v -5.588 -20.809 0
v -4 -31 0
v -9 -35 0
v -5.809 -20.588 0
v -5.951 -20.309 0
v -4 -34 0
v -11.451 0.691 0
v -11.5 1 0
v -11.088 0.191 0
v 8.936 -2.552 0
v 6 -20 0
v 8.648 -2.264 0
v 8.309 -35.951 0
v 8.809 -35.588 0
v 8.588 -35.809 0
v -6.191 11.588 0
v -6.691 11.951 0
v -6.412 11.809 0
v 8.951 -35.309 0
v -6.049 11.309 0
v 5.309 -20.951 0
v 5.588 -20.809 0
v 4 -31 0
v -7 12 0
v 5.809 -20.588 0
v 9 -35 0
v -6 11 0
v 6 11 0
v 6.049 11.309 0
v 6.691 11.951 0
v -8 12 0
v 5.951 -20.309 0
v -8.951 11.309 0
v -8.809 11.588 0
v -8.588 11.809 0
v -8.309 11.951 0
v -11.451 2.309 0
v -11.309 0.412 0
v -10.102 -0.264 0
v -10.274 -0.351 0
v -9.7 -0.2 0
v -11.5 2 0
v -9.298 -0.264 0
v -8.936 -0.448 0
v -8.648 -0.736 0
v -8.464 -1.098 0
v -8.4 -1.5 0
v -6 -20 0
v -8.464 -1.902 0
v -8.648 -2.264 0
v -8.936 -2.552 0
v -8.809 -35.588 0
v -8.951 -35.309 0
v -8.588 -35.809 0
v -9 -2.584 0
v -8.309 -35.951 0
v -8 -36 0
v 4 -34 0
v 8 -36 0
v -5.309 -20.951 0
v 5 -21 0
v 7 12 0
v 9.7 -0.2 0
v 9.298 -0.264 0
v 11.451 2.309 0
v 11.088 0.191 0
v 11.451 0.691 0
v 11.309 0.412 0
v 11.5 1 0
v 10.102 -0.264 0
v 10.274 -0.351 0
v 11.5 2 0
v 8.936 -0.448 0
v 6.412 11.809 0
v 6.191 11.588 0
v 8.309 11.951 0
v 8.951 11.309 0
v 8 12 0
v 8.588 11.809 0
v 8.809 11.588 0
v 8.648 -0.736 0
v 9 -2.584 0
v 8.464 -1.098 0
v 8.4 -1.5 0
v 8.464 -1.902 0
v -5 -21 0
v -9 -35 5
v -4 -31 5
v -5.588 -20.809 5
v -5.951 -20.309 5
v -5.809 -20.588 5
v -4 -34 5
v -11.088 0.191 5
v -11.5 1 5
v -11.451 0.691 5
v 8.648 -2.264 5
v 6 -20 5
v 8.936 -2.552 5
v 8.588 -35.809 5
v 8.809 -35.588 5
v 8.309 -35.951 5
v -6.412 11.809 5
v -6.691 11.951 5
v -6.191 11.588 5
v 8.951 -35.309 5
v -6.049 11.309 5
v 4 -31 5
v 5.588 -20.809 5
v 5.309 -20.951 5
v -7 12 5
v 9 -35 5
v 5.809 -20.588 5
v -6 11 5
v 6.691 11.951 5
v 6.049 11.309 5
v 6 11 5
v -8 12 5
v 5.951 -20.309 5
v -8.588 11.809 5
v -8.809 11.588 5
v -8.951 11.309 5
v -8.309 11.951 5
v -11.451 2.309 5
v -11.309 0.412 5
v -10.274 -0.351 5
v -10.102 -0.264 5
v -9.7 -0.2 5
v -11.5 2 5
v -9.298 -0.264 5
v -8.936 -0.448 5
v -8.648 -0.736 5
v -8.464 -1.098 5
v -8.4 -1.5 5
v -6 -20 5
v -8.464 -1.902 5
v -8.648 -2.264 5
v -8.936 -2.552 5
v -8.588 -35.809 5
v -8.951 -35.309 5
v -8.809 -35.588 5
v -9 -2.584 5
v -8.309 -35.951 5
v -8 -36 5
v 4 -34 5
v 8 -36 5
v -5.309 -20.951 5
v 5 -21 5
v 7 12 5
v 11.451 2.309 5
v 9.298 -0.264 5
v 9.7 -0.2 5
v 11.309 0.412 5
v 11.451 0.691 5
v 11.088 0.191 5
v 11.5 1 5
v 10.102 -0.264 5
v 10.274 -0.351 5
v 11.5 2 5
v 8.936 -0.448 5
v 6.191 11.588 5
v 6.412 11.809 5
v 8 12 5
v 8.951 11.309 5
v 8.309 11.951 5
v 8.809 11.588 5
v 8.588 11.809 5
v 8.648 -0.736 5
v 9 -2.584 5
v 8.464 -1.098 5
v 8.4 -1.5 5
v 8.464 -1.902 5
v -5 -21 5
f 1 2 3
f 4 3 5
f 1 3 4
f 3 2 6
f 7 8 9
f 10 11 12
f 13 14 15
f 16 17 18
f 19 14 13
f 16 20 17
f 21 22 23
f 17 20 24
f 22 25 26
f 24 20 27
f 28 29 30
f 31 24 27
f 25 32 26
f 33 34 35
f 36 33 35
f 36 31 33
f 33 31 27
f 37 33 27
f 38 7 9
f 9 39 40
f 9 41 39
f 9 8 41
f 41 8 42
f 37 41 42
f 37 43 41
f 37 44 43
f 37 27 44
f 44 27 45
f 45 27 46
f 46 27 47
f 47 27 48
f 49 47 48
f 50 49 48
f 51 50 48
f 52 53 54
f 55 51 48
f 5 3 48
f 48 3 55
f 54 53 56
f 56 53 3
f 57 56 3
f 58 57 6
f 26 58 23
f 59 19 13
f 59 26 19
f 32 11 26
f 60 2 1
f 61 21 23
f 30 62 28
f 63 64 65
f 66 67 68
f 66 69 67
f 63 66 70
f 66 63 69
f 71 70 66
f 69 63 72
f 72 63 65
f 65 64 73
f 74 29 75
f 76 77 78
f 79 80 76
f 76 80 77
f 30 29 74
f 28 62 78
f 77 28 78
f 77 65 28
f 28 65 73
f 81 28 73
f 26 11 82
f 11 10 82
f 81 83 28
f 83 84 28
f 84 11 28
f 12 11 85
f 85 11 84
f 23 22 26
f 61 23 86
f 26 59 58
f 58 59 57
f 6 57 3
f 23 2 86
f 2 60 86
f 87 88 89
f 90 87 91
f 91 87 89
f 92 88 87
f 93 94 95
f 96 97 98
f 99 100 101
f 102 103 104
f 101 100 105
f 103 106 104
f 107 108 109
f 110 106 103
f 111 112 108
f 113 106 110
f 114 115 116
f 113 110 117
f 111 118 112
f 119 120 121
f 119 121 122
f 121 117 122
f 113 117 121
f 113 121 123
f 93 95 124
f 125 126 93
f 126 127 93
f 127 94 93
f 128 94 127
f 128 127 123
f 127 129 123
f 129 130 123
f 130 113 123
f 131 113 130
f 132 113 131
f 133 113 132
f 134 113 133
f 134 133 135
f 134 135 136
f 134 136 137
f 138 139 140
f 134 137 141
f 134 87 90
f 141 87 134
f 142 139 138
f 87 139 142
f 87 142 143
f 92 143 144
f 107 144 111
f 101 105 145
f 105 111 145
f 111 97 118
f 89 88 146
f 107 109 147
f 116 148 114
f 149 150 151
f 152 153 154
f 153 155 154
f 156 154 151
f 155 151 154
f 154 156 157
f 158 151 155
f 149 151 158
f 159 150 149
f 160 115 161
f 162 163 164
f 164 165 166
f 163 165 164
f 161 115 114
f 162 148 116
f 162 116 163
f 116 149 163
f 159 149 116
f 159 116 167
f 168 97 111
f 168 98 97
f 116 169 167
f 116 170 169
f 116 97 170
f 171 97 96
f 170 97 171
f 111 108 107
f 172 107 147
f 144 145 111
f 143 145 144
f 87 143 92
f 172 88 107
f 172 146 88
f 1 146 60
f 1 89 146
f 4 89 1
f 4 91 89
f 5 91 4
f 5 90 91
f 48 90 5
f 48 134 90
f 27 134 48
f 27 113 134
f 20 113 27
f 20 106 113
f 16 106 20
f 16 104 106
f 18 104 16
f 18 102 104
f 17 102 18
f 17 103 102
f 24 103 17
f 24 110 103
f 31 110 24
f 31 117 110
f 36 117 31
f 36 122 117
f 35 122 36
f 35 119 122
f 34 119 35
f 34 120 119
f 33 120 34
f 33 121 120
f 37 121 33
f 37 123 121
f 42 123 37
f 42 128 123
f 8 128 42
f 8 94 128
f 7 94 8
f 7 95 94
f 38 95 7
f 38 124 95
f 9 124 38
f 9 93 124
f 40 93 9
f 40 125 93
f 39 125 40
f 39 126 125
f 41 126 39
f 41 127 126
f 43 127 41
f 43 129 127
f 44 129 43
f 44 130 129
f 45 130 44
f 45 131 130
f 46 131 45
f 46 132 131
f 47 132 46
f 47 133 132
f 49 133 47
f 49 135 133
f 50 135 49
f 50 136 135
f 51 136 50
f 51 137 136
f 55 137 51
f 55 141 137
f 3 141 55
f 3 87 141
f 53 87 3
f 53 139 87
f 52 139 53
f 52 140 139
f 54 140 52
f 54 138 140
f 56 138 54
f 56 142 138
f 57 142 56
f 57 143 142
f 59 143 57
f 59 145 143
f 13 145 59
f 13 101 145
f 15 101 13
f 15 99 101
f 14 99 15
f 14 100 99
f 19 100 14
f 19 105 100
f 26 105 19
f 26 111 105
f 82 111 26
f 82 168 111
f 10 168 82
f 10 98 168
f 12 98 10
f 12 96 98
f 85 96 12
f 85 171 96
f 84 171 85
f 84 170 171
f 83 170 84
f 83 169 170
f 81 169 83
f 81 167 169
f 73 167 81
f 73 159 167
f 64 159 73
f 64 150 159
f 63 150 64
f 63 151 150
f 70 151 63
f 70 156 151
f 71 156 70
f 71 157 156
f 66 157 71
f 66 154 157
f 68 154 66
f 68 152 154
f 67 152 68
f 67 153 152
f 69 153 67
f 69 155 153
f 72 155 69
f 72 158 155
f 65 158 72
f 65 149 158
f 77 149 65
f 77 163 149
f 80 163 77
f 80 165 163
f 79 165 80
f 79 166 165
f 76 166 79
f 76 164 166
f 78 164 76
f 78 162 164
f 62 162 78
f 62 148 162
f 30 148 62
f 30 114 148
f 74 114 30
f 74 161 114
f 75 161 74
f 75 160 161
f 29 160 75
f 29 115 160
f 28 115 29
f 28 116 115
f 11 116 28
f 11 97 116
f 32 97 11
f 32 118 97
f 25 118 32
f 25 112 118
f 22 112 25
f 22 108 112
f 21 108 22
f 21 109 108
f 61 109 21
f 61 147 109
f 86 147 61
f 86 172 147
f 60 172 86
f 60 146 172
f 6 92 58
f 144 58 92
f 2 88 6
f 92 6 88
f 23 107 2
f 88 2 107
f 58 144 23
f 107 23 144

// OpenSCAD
$fn = 20;

module snap_together_key_half() {
  translate([6,0,0])
  difference() {
    union() {
      // Tooth
      
      hull(){  
        translate([1,10,0])
        minkowski() {
          circle(1);
          square([1,1]);
        }

        translate([1,1,0])
        minkowski() {
          circle(1);
          square([3.5,1]);
        }

        translate([1,0,0])
        minkowski() {
          circle(1);
          square([2,1]);
        }
      }
              
      // Prong
      translate([0,-20,0])
      square([3,20]);
      
      // Handle
      translate([-6,-35,0])
      minkowski() {
        circle(1);
        square([8,15]);
      }
    }
    
    // Detent hole
    translate([3.7,-1.5,0])
    circle(1.3);

    // Fillet
    translate([-11,-20,0])
    minkowski() {
      circle(1);
      square([10,2]);
    }
        
    // Loophole
    translate([-7,-34,0])
    square([5,3]);
  }
}

module snap_together_key() {
  union() {
    snap_together_key_half();
    mirror([1,0,0])
    snap_together_key_half();
  }
}

module snap_together_lock_half() {

  translate([10,-3,0])
  hull() {
    translate([0,0.25,0])
    minkowski() {
      circle(1);
      square([1,1]);
    }
    
    translate([0,-10,0])
    minkowski() {
      circle(1);
      square([5,1]);
    }
    
    translate([0,-18,0])
    minkowski() {
      circle(1);
      square([5,1]);
    }
  }

  translate([0,12,0])
  square([5,5]);
}

module snap_together_lock_posts() {
  union() {
    snap_together_lock_half();
    mirror([1,0,0])
    snap_together_lock_half();
  }
}

linear_extrude(height=5)
snap_together_key();

module snap_together_lock() {
  linear_extrude(height=2.7)
  snap_together_lock_posts();

  translate([0,0,-2])
  linear_extrude(height=2) {
    difference(){
      hull() {
        translate([15,-21,0])
        circle(1);
        translate([-15,-21,0])
        circle(1);

        translate([15,-12,0])
        circle(1);
        translate([-15,-12,0])
        circle(1);
        
        translate([11,-1.7,0])
        circle(1);
        translate([-11,-1.7,0])
        circle(1);

        translate([5,16,0])
        circle(1);        
        translate([-5,16,0])
        circle(1);
      }
      
      translate([11,6,0])
      circle(7);
      
      translate([-11,6,0])
      circle(7);

    }
  }
}

module snap_together_lock_full() {
    difference() {
    snap_together_lock();

    translate([-3.6,13.7,-4])
    cube([7.2,2,8]);
    
    translate([11.5,-18,-4])
    cube([2,7.2,8]);

    translate([-13.5,-18,-4])
    cube([2,7.2,8]);
  }
}

// snap_together_lock_full();
